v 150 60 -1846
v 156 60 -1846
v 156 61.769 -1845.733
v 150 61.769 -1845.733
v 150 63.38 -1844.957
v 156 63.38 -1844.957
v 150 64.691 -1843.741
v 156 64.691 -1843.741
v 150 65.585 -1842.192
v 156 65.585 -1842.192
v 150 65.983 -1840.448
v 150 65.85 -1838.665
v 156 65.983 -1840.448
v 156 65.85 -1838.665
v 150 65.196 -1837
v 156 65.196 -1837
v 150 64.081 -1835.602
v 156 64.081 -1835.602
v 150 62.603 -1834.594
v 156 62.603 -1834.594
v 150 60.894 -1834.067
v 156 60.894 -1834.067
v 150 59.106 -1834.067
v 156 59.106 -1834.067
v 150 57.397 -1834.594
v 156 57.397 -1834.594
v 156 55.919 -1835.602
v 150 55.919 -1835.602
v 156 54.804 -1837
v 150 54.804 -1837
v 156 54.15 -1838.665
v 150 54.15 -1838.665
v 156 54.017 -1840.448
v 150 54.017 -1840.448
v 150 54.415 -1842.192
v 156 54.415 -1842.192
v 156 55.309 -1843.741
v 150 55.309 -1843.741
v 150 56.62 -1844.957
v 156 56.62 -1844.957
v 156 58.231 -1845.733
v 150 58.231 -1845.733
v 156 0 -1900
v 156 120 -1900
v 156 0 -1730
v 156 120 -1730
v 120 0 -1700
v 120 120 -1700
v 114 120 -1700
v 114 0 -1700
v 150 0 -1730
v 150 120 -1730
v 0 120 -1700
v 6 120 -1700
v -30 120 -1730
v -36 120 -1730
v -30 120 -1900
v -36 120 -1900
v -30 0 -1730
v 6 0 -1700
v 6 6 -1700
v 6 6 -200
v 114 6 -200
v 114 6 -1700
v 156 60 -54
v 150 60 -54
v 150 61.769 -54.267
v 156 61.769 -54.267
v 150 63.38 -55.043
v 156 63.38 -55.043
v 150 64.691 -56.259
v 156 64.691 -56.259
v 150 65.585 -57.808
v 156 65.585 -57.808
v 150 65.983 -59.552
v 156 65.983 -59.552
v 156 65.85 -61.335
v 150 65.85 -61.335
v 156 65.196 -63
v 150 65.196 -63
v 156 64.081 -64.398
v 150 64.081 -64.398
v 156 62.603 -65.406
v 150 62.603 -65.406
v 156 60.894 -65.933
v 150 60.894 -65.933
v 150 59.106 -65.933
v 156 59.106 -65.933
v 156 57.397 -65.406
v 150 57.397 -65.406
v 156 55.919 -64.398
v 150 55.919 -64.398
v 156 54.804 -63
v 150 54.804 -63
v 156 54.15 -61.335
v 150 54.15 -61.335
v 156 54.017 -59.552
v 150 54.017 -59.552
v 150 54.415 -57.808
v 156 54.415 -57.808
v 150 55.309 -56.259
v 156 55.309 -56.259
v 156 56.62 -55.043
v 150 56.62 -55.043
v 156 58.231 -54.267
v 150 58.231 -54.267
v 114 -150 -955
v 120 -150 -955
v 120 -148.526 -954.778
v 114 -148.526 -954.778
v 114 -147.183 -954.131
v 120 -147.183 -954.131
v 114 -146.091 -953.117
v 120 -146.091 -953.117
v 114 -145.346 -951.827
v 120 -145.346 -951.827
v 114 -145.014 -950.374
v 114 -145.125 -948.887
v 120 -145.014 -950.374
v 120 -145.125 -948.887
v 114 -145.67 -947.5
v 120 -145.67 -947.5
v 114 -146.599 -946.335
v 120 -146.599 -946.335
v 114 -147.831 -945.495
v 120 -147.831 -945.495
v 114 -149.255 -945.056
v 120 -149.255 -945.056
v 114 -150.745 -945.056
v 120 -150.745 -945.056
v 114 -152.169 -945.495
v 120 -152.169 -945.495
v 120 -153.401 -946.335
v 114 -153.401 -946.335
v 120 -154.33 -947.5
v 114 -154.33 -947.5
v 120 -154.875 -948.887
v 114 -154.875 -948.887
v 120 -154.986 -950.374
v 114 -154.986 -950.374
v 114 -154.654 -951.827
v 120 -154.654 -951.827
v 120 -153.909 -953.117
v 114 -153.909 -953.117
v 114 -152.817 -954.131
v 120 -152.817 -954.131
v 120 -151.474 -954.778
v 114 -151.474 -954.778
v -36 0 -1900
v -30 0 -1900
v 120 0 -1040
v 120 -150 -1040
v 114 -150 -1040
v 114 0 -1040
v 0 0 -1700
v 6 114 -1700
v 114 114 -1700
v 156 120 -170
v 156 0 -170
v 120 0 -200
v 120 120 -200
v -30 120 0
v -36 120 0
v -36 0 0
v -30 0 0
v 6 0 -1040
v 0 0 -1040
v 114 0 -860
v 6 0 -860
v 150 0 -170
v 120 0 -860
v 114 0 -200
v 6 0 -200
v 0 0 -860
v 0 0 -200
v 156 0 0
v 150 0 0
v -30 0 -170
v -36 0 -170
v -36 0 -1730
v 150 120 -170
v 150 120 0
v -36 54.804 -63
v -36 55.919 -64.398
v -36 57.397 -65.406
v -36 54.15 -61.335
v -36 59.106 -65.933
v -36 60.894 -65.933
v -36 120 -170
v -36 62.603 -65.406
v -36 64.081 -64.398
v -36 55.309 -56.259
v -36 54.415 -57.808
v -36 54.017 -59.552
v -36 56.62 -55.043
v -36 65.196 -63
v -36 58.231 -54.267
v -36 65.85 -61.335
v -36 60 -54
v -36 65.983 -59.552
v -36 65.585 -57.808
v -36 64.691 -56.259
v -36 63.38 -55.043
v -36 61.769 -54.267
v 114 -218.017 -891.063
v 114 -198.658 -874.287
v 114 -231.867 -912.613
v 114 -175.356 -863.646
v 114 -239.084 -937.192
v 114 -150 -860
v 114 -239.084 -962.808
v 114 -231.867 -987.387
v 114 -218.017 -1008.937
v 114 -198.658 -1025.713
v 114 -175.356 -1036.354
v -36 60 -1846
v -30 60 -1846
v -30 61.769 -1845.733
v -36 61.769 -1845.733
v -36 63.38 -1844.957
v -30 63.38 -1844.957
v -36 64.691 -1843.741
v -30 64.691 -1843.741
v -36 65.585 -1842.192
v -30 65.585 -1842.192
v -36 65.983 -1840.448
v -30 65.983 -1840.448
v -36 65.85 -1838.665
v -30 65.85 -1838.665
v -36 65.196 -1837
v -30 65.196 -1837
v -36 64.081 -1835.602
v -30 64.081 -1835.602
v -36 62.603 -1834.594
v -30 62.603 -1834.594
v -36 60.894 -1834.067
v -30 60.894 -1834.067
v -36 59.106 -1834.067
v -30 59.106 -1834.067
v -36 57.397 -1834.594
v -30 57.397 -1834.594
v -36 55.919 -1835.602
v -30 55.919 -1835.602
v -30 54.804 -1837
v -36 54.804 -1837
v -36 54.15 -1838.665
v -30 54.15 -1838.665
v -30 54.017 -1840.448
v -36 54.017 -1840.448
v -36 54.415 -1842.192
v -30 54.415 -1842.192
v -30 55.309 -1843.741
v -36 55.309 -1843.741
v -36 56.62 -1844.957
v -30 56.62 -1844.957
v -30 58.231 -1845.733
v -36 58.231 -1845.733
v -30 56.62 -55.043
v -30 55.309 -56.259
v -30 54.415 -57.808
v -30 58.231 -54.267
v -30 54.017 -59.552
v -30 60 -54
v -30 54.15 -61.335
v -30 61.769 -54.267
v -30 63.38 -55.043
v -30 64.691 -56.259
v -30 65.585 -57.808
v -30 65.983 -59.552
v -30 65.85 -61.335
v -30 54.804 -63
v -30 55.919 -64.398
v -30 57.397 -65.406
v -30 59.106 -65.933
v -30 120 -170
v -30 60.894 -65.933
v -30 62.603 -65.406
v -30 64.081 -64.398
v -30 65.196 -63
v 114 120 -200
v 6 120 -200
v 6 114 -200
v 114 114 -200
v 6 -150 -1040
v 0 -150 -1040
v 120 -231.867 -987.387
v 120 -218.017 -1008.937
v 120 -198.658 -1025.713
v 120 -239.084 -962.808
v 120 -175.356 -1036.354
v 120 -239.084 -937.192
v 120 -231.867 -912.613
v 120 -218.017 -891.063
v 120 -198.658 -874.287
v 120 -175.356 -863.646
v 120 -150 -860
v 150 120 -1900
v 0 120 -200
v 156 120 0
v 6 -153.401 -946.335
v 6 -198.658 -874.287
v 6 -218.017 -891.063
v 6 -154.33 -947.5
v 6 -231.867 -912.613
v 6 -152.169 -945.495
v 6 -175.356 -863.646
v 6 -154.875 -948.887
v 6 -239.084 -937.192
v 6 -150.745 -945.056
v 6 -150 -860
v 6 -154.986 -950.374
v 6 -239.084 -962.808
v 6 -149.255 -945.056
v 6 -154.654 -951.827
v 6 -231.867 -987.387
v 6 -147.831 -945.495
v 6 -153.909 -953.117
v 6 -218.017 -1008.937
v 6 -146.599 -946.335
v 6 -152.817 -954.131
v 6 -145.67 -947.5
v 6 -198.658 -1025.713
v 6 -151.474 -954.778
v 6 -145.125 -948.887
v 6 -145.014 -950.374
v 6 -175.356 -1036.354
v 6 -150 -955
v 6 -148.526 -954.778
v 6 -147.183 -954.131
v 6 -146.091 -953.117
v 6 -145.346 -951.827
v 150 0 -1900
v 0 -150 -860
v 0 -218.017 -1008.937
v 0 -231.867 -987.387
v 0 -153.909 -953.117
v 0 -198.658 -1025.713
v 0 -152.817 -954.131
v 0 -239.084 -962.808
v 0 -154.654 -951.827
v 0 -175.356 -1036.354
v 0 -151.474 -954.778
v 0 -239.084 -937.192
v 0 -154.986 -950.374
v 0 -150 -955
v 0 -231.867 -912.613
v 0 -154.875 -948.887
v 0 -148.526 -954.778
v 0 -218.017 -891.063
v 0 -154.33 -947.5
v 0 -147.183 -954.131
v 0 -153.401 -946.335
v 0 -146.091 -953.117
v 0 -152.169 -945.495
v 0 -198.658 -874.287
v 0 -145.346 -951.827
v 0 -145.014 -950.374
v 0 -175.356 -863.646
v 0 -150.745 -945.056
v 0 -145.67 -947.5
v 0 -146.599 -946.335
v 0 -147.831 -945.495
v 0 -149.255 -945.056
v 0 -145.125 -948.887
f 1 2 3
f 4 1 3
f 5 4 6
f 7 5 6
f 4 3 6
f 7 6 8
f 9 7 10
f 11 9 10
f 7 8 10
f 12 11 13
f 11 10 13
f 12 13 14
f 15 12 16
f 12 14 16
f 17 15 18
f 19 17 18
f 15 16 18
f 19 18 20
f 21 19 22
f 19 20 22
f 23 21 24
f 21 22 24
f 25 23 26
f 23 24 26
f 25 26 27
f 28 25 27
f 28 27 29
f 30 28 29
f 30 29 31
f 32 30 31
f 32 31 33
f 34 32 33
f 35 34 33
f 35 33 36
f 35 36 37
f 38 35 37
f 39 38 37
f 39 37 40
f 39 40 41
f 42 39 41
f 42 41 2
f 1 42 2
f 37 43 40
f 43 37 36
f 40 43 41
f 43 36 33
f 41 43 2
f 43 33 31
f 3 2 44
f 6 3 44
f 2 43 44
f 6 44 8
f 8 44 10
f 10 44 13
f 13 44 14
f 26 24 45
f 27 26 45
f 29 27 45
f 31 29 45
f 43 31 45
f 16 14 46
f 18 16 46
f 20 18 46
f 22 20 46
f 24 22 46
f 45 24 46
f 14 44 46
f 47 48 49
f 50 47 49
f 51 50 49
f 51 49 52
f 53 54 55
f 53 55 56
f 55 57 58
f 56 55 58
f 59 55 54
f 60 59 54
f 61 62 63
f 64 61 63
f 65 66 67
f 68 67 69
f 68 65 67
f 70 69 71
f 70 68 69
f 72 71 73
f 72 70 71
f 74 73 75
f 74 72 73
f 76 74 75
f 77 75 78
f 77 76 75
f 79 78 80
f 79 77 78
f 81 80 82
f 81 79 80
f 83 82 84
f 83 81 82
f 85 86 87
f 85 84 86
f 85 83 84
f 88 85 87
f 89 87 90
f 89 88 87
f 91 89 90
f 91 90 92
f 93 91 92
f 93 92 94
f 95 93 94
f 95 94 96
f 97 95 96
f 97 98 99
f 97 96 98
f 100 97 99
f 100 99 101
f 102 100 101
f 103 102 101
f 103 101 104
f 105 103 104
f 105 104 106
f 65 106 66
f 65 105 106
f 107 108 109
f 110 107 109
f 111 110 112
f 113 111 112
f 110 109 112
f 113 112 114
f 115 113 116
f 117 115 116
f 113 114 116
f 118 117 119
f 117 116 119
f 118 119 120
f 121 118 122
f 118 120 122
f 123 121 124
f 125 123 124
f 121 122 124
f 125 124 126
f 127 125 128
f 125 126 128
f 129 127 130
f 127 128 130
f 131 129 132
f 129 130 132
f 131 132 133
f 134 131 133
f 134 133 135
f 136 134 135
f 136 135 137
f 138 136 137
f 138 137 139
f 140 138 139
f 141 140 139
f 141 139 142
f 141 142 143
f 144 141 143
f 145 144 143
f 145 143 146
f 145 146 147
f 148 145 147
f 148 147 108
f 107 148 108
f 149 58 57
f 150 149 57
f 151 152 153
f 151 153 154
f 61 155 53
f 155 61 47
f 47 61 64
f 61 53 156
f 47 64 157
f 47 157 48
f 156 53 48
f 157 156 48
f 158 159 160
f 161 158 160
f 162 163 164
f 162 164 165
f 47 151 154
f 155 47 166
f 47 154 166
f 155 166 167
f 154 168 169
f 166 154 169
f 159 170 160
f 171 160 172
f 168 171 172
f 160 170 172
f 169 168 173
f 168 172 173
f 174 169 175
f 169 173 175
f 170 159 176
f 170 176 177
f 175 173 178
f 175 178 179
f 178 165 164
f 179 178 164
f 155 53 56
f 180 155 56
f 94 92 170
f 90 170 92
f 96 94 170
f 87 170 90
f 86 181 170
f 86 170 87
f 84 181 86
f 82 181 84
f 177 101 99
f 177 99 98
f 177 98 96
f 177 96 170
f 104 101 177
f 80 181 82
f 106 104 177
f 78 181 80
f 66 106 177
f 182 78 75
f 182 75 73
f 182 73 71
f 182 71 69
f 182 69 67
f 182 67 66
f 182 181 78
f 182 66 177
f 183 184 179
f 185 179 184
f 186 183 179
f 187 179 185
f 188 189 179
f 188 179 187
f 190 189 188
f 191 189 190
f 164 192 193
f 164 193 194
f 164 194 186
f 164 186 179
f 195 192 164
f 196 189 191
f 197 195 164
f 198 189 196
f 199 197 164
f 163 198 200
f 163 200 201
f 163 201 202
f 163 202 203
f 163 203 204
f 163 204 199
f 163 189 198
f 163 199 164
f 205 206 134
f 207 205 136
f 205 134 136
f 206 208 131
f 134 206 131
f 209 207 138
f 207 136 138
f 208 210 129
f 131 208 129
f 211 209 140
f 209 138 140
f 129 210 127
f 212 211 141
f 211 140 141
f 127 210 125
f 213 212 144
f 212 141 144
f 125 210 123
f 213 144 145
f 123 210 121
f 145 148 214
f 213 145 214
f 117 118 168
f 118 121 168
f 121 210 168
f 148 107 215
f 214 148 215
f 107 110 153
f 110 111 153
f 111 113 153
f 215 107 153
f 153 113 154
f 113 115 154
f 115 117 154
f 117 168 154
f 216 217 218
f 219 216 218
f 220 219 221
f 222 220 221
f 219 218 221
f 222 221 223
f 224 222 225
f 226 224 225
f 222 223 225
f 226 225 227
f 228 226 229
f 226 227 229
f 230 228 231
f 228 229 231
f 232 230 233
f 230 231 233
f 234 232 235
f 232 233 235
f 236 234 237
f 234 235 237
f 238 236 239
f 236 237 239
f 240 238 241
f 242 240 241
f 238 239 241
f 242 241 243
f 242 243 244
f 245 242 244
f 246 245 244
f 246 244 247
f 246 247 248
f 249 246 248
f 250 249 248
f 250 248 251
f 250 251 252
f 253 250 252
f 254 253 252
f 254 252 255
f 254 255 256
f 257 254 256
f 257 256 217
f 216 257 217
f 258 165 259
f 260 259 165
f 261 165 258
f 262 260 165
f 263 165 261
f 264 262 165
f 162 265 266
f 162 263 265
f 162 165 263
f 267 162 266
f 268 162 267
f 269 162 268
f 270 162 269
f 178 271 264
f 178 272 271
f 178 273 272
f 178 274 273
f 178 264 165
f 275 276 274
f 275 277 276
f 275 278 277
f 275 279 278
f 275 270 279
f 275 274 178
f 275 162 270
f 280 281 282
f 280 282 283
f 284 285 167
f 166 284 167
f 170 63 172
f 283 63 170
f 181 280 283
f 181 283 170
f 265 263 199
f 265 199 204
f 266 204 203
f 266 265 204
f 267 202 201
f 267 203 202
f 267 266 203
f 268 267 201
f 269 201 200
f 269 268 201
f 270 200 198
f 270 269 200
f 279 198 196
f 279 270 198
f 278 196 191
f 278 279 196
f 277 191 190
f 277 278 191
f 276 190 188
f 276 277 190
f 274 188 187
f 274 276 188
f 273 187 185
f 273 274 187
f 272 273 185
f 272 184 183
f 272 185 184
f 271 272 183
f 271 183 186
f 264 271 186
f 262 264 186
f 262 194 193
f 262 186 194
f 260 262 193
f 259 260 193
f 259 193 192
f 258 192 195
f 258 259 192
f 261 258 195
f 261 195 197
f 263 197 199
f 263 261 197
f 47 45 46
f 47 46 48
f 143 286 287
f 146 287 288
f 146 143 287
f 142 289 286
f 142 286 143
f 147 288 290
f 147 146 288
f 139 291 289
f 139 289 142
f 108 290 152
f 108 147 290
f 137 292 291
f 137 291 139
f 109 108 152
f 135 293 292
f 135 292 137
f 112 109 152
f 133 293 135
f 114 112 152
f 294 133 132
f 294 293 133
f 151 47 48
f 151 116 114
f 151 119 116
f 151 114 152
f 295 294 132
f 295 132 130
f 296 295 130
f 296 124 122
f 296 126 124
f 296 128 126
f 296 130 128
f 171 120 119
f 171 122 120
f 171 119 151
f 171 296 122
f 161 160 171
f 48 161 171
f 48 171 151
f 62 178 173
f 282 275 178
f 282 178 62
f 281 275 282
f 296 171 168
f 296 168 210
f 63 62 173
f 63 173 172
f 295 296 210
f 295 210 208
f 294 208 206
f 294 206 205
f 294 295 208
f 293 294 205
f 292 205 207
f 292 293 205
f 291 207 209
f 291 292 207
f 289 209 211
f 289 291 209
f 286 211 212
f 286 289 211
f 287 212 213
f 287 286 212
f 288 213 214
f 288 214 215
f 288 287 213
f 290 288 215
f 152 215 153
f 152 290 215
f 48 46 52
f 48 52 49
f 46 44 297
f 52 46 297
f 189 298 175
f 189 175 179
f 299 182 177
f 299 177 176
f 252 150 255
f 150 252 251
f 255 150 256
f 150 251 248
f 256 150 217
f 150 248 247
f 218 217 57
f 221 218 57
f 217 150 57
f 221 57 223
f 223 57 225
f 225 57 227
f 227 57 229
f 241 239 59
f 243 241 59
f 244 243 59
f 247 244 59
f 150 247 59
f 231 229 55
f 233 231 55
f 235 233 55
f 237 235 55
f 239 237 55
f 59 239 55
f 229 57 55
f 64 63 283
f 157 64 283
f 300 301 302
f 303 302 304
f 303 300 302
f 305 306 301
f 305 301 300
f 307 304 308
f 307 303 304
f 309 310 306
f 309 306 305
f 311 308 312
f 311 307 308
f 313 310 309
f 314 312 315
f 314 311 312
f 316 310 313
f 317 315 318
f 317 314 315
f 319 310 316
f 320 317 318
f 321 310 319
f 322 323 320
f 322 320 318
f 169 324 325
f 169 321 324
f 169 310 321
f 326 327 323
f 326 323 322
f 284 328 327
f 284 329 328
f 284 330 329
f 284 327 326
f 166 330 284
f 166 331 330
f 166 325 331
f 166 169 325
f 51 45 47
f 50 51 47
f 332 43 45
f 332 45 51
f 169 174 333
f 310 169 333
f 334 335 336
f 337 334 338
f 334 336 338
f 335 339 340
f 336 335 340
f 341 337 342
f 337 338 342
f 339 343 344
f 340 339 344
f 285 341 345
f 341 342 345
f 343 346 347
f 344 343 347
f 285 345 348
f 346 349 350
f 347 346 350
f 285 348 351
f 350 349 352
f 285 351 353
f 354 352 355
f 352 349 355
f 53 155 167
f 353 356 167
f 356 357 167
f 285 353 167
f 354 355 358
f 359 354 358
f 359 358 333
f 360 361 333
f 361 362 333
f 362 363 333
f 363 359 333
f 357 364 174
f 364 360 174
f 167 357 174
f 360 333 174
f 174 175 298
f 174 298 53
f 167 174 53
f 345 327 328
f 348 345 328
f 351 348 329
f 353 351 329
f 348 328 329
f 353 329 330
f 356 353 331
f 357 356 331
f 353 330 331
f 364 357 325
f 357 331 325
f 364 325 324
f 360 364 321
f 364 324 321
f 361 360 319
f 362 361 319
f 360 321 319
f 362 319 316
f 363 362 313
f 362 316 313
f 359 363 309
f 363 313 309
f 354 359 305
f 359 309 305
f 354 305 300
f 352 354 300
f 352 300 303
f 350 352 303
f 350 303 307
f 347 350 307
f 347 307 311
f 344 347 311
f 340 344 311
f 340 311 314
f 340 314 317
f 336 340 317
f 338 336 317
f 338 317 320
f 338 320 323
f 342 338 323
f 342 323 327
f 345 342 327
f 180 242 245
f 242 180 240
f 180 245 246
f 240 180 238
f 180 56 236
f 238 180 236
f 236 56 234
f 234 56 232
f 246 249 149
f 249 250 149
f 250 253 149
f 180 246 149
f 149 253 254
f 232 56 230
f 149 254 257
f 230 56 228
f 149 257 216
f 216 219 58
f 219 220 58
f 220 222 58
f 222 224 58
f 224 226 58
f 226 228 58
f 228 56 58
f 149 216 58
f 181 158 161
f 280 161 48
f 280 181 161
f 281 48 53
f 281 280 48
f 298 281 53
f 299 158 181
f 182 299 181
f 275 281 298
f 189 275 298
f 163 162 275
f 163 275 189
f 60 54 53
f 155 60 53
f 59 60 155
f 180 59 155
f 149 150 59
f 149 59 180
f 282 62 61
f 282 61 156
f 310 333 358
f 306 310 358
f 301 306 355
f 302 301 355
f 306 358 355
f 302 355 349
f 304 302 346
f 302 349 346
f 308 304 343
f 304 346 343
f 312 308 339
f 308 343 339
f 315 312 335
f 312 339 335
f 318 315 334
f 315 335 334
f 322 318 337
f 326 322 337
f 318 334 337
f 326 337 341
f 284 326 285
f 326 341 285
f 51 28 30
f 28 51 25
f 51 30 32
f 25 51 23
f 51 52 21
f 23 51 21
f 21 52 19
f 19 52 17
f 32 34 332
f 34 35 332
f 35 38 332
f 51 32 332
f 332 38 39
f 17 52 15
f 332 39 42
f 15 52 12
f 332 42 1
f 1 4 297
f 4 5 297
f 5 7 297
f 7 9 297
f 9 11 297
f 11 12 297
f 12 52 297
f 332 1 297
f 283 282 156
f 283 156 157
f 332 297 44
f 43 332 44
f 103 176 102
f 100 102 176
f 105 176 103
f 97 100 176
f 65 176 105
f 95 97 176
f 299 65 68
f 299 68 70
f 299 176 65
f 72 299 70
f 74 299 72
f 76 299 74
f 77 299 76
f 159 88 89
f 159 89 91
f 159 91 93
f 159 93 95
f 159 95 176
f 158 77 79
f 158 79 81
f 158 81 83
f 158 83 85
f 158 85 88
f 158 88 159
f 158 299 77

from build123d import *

# Parameters (mm, degrees)
IZIM1_W                       = 120
IZIM1_H                       = 120
IZIM1_W_2                     = 108
IZIM1_H_2                     = 108
Y_KSEKLIK_EKSTR_ZYON1_DEPTH   = 1700
Y_KSEKLIK_EKSTR_ZYON2_DEPTH   = 120
Y_KSEKLIK_EKSTR_ZYON2_2_DEPTH = 120
IZIM3_R                       = 6
KES_EKSTR_ZYON3_DEPTH         = 264
IZIM4_W                       = 120
IZIM4_H                       = 200
KES_EKSTR_ZYON4_DEPTH         = 184
Y_KSEKLIK_EKSTR_ZYON3_DEPTH   = 6
Y_KSEKLIK_EKSTR_ZYON4_DEPTH   = 6
IZIM8_R                       = 5
KES_EKSTR_ZYON5_DEPTH         = 181


with BuildPart() as part:
    # Çizim1 → Yükseklik-Ekstrüzyon1 (new body)
    with BuildSketch(Plane.XY):
        with Locations((60, 60)):
            Rectangle(IZIM1_W, IZIM1_H)
        with Locations((60, 60)):
            Rectangle(IZIM1_W_2, IZIM1_H_2, mode=Mode.SUBTRACT)
    extrude(amount=-Y_KSEKLIK_EKSTR_ZYON1_DEPTH)

    # Çizim4 → Kes-Ekstrüzyon4 (cut)
    with BuildSketch(Plane(origin=(0, 120, 0), x_dir=(1, 0, 0), z_dir=(0, 1, 0))):
        with Locations((60, 100)):
            Rectangle(IZIM4_W, IZIM4_H)
    extrude(amount=-KES_EKSTR_ZYON4_DEPTH, mode=Mode.SUBTRACT)


with BuildPart() as body_2:
    # Çizim2 → Yükseklik-Ekstrüzyon2 (new body)
    with BuildSketch(Plane(origin=(0, 120, 0), x_dir=(1, 0, 0), z_dir=(0, 1, 0))):
        Polygon((0, 1700), (-36, 1730), (-36, 1900), (-30, 1900), (-30, 1730), (6, 1700), align=None)
    y_kseklik_ekstr_zyon2 = extrude(amount=-Y_KSEKLIK_EKSTR_ZYON2_DEPTH)


with BuildPart() as body_3:
    # Çizim2 → Y_kseklik-Ekstr_zyon2 2 (new body)
    with BuildSketch(Plane(origin=(0, 120, 0), x_dir=(1, 0, 0), z_dir=(0, 1, 0))):
        Polygon((150, 1900), (156, 1900), (156, 1730), (120, 1700), (114, 1700), (150, 1730), align=None)
    y_kseklik_ekstr_zyon2_2 = extrude(amount=-Y_KSEKLIK_EKSTR_ZYON2_2_DEPTH)


with BuildPart() as kes_ekstr_zyon3_tool:
    # Çizim3 → Kes-Ekstrüzyon3 (new body)
    with BuildSketch(Plane(origin=(156, 0, 0), x_dir=(0, 0, -1), z_dir=(1, 0, 0))):
        with Locations((1840, 60)):
            Circle(IZIM3_R)
    kes_ekstr_zyon3 = extrude(amount=-KES_EKSTR_ZYON3_DEPTH)


with BuildPart() as body_2_1:
    add(body_2.part)

    # Kes-Ekstrüzyon3: cut by kes_ekstr_zyon3_tool
    add(kes_ekstr_zyon3_tool.part, mode=Mode.SUBTRACT)


with BuildPart() as body_3_1:
    add(body_3.part)

    # Kes-Ekstrüzyon3: cut by kes_ekstr_zyon3_tool
    add(kes_ekstr_zyon3_tool.part, mode=Mode.SUBTRACT)


with BuildPart() as part_1:
    add(part.part)

    # Aynalama1: Yükseklik-Ekstrüzyon2, Y_kseklik-Ekstr_zyon2 2 across plane
    add(y_kseklik_ekstr_zyon2.mirror(Plane.XY.offset(-950)))
    add(y_kseklik_ekstr_zyon2_2.mirror(Plane.XY.offset(-950)))

    # Aynalama2: Kes-Ekstrüzyon3 across plane
    add(kes_ekstr_zyon3.mirror(Plane.XY.offset(-950)), mode=Mode.SUBTRACT)

    # Çizim6 → Yükseklik-Ekstrüzyon3 (add)
    with BuildSketch(Plane(origin=(120, 0, 0), x_dir=(0, 0, -1), z_dir=(1, 0, 0))):
        with BuildLine():
            Line((860, 0), (860, -150))
            ThreePointArc((860, -150), (950, -240), (1040, -150))
            Line((1040, -150), (1040, 0))
            Line((1040, 0), (860, 0))
        make_face()
    extrude(amount=-Y_KSEKLIK_EKSTR_ZYON3_DEPTH)

    # Çizim7 → Yükseklik-Ekstrüzyon4 (add)
    with BuildSketch(Plane.ZY):
        with BuildLine():
            Line((-1040, 0), (-860, 0))
            Line((-860, 0), (-860, -150))
            ThreePointArc((-860, -150), (-950, -240), (-1040, -150))
            Line((-1040, -150), (-1040, 0))
        make_face()
    extrude(amount=-Y_KSEKLIK_EKSTR_ZYON4_DEPTH)

    # Çizim8 → Kes-Ekstrüzyon5 (cut)
    with BuildSketch(Plane(origin=(120, 0, 0), x_dir=(0, 0, -1), z_dir=(1, 0, 0))):
        with Locations((950, -150)):
            Circle(IZIM8_R)
    extrude(amount=-KES_EKSTR_ZYON5_DEPTH, mode=Mode.SUBTRACT)


solid = Compound([body_2_1.part, body_3_1.part, part_1.part])
